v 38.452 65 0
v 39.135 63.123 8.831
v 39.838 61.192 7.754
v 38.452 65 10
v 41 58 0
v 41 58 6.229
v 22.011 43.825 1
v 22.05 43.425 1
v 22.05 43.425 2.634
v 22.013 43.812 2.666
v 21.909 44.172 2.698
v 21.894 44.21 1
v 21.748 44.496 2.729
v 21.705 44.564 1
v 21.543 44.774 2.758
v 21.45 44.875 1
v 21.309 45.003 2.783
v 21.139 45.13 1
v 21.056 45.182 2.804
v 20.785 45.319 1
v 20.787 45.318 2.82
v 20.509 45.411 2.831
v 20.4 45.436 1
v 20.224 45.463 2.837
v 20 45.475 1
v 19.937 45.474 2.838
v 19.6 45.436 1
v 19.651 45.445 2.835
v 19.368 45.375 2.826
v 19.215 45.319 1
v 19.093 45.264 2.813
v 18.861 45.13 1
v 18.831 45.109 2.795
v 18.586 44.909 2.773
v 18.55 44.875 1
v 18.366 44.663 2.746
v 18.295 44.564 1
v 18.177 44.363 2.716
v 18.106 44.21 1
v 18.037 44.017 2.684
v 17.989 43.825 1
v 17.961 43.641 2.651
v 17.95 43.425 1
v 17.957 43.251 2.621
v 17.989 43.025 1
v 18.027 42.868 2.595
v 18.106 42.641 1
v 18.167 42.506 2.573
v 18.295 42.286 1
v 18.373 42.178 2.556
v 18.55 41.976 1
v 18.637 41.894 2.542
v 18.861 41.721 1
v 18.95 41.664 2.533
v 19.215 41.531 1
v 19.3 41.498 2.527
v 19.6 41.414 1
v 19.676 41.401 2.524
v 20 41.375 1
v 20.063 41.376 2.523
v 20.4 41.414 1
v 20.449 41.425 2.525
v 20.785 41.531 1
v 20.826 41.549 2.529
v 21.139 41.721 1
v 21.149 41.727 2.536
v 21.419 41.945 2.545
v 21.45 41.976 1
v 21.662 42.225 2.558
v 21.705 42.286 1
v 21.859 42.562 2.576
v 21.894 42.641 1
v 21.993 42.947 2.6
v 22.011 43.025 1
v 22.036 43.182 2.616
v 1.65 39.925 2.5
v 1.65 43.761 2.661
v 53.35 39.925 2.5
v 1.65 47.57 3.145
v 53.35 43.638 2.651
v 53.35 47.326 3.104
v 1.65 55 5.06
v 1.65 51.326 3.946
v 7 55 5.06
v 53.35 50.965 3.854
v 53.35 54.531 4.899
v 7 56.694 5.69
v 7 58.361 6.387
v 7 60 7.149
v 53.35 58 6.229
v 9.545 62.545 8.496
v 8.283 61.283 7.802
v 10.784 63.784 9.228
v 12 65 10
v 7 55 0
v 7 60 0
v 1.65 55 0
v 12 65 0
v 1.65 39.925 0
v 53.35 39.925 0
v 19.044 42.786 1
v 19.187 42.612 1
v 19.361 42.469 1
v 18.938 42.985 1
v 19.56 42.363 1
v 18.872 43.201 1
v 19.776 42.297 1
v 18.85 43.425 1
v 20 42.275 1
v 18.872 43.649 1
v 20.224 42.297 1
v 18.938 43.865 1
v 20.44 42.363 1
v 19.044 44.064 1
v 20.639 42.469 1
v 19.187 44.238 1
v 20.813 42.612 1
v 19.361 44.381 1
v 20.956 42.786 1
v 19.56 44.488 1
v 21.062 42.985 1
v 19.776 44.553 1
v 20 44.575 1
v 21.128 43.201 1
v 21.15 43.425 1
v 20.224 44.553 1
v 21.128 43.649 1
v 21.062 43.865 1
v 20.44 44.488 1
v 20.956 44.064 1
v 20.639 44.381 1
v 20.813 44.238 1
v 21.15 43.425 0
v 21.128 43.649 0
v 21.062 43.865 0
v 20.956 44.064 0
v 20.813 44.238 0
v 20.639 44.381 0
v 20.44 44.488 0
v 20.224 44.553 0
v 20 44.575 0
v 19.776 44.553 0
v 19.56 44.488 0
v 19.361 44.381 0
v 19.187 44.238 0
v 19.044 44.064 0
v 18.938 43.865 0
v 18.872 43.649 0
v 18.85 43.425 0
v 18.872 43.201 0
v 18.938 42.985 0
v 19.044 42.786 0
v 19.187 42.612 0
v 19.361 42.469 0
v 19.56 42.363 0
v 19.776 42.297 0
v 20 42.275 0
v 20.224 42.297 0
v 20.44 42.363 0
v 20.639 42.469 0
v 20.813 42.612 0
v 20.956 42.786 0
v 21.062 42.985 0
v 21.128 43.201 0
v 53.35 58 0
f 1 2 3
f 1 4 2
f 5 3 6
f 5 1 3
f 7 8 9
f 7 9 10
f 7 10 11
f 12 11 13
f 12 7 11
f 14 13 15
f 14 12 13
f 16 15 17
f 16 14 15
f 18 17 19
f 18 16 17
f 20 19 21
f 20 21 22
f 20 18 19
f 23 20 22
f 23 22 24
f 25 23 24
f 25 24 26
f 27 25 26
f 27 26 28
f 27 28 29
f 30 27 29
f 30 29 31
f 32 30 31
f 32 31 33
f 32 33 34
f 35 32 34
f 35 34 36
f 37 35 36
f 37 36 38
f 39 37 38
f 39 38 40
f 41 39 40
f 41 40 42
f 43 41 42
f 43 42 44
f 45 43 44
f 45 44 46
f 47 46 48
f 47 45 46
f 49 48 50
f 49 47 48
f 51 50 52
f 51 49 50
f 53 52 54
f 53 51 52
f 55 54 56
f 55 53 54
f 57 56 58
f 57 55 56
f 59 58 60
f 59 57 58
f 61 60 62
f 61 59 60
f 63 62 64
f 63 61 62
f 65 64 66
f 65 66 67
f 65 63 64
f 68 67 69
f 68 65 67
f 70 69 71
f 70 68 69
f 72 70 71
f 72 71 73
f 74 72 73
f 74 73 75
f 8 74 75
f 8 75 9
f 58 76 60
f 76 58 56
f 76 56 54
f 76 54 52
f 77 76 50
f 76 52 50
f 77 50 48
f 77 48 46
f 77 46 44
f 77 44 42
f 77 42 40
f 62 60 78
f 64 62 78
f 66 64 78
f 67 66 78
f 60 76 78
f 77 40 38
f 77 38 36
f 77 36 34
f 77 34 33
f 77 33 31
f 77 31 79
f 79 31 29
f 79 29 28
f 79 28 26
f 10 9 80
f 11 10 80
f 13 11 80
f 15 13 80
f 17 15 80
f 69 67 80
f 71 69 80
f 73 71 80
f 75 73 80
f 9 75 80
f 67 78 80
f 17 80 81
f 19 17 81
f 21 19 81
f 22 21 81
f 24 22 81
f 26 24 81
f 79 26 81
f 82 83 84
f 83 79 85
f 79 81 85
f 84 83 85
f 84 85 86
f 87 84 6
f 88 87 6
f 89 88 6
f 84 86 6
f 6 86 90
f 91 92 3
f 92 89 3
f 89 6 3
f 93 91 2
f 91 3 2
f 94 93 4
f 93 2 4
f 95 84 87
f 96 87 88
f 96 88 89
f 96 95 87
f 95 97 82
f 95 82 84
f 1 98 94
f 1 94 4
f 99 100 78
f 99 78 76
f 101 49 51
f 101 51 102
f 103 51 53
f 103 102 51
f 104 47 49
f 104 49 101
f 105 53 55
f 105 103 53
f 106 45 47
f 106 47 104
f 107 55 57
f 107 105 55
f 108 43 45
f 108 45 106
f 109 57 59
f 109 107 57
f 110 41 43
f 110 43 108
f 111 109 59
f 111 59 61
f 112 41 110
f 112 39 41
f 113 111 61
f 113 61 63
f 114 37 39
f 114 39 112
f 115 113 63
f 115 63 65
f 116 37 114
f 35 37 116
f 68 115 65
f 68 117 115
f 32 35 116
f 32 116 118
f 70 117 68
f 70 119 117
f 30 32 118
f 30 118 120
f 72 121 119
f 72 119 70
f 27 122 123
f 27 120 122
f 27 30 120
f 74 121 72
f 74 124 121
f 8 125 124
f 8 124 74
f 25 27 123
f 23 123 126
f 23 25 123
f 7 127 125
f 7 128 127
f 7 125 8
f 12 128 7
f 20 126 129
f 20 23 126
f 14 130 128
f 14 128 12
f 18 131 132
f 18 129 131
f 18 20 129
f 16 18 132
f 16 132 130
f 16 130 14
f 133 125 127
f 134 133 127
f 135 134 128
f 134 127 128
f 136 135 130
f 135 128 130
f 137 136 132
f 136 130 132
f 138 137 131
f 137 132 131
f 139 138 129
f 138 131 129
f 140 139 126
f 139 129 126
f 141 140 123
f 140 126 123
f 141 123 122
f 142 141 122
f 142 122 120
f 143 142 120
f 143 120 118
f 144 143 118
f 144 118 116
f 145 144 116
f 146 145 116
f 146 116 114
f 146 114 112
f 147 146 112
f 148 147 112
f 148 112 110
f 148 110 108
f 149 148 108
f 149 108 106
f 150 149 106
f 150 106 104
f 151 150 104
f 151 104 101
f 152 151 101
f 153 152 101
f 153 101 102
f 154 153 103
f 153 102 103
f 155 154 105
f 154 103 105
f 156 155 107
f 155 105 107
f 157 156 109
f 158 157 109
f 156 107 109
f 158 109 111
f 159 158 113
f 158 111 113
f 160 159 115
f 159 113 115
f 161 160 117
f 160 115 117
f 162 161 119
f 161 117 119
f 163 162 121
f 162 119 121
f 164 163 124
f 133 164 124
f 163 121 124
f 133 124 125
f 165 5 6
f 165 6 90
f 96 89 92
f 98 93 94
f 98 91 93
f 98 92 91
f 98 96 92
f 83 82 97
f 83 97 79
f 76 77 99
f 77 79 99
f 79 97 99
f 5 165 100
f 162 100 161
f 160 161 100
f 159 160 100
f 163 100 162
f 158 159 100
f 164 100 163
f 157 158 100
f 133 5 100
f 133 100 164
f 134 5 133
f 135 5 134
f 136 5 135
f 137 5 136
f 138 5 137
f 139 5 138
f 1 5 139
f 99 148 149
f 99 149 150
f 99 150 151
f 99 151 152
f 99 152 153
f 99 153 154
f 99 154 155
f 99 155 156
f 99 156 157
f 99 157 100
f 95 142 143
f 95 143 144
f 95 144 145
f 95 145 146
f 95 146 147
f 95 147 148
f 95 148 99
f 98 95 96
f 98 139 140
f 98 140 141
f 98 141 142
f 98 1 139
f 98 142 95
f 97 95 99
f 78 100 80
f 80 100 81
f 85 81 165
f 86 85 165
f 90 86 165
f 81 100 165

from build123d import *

# Parameters (mm, degrees)
AUFSATZ_LINEAR_AUSTRAGEN1_DEPTH = 10
SKIZZE2_R                       = 1.15
SCHNITT_LINEAR_AUSTRAGEN1_DEPTH = 11
SKIZZE3_R                       = 2.05
SCHNITT_LINEAR_AUSTRAGEN2_DEPTH = 2
SCHNITT_LINEAR_AUSTRAGEN3_DEPTH = 52.7
SCHNITT_LINEAR_START            = 1
SKIZZE5_R                       = 2.05
SCHNITT_LINEAR_AUSTRAGEN4_DEPTH = 10.0000001


with BuildPart() as part:
    # Skizze1 → Aufsatz-Linear austragen1 (new body)
    with BuildSketch(Plane.XY):
        Polygon((53.35, 39.925098055), (1.65, 39.925098055), (1.65, 46.925098055), (1.65, 55), (7, 55), (7, 60), (12, 65), (38.45220836, 65), (41, 58), (53.35, 58), (53.35, 46.925098055), align=None)
    extrude(amount=AUFSATZ_LINEAR_AUSTRAGEN1_DEPTH)

    # Skizze2 → Schnitt-Linear austragen1 (cut, through all)
    with BuildSketch(Plane.XY.offset(10)):
        with Locations((20, 43.425098055)):
            Circle(SKIZZE2_R)
    extrude(amount=-SCHNITT_LINEAR_AUSTRAGEN1_DEPTH, mode=Mode.SUBTRACT)

    # Skizze3 → Schnitt-Linear austragen2 (cut)
    with BuildSketch(Plane.XY.offset(10)):
        with Locations((20, 43.425098055)):
            Circle(SKIZZE3_R)
    extrude(amount=-SCHNITT_LINEAR_AUSTRAGEN2_DEPTH, mode=Mode.SUBTRACT)

    # Skizze4 → Schnitt-Linear austragen3 (cut, through all)
    with BuildSketch(Plane(origin=(53.35, 0, 0), x_dir=(0, 0, -1), z_dir=(1, 0, 0))):
        with BuildLine():
            Line((-10, 65), (-48.166713837, 39.925098055))
            Line((-48.166713837, 39.925098055), (-2.5, 39.925098055))
            ThreePointArc((-2.5, 39.925098055), (-4.415158713, 53.011357142), (-10, 65))
        make_face()
    extrude(amount=-SCHNITT_LINEAR_AUSTRAGEN3_DEPTH, mode=Mode.SUBTRACT)

    # Skizze5 → Schnitt-Linear austragen4 (cut, through all)
    with BuildSketch(Plane.XY.offset(SCHNITT_LINEAR_START)):
        with Locations((20, 43.425098055)):
            Circle(SKIZZE5_R)
    extrude(amount=SCHNITT_LINEAR_AUSTRAGEN4_DEPTH, mode=Mode.SUBTRACT)


solid = part.part
